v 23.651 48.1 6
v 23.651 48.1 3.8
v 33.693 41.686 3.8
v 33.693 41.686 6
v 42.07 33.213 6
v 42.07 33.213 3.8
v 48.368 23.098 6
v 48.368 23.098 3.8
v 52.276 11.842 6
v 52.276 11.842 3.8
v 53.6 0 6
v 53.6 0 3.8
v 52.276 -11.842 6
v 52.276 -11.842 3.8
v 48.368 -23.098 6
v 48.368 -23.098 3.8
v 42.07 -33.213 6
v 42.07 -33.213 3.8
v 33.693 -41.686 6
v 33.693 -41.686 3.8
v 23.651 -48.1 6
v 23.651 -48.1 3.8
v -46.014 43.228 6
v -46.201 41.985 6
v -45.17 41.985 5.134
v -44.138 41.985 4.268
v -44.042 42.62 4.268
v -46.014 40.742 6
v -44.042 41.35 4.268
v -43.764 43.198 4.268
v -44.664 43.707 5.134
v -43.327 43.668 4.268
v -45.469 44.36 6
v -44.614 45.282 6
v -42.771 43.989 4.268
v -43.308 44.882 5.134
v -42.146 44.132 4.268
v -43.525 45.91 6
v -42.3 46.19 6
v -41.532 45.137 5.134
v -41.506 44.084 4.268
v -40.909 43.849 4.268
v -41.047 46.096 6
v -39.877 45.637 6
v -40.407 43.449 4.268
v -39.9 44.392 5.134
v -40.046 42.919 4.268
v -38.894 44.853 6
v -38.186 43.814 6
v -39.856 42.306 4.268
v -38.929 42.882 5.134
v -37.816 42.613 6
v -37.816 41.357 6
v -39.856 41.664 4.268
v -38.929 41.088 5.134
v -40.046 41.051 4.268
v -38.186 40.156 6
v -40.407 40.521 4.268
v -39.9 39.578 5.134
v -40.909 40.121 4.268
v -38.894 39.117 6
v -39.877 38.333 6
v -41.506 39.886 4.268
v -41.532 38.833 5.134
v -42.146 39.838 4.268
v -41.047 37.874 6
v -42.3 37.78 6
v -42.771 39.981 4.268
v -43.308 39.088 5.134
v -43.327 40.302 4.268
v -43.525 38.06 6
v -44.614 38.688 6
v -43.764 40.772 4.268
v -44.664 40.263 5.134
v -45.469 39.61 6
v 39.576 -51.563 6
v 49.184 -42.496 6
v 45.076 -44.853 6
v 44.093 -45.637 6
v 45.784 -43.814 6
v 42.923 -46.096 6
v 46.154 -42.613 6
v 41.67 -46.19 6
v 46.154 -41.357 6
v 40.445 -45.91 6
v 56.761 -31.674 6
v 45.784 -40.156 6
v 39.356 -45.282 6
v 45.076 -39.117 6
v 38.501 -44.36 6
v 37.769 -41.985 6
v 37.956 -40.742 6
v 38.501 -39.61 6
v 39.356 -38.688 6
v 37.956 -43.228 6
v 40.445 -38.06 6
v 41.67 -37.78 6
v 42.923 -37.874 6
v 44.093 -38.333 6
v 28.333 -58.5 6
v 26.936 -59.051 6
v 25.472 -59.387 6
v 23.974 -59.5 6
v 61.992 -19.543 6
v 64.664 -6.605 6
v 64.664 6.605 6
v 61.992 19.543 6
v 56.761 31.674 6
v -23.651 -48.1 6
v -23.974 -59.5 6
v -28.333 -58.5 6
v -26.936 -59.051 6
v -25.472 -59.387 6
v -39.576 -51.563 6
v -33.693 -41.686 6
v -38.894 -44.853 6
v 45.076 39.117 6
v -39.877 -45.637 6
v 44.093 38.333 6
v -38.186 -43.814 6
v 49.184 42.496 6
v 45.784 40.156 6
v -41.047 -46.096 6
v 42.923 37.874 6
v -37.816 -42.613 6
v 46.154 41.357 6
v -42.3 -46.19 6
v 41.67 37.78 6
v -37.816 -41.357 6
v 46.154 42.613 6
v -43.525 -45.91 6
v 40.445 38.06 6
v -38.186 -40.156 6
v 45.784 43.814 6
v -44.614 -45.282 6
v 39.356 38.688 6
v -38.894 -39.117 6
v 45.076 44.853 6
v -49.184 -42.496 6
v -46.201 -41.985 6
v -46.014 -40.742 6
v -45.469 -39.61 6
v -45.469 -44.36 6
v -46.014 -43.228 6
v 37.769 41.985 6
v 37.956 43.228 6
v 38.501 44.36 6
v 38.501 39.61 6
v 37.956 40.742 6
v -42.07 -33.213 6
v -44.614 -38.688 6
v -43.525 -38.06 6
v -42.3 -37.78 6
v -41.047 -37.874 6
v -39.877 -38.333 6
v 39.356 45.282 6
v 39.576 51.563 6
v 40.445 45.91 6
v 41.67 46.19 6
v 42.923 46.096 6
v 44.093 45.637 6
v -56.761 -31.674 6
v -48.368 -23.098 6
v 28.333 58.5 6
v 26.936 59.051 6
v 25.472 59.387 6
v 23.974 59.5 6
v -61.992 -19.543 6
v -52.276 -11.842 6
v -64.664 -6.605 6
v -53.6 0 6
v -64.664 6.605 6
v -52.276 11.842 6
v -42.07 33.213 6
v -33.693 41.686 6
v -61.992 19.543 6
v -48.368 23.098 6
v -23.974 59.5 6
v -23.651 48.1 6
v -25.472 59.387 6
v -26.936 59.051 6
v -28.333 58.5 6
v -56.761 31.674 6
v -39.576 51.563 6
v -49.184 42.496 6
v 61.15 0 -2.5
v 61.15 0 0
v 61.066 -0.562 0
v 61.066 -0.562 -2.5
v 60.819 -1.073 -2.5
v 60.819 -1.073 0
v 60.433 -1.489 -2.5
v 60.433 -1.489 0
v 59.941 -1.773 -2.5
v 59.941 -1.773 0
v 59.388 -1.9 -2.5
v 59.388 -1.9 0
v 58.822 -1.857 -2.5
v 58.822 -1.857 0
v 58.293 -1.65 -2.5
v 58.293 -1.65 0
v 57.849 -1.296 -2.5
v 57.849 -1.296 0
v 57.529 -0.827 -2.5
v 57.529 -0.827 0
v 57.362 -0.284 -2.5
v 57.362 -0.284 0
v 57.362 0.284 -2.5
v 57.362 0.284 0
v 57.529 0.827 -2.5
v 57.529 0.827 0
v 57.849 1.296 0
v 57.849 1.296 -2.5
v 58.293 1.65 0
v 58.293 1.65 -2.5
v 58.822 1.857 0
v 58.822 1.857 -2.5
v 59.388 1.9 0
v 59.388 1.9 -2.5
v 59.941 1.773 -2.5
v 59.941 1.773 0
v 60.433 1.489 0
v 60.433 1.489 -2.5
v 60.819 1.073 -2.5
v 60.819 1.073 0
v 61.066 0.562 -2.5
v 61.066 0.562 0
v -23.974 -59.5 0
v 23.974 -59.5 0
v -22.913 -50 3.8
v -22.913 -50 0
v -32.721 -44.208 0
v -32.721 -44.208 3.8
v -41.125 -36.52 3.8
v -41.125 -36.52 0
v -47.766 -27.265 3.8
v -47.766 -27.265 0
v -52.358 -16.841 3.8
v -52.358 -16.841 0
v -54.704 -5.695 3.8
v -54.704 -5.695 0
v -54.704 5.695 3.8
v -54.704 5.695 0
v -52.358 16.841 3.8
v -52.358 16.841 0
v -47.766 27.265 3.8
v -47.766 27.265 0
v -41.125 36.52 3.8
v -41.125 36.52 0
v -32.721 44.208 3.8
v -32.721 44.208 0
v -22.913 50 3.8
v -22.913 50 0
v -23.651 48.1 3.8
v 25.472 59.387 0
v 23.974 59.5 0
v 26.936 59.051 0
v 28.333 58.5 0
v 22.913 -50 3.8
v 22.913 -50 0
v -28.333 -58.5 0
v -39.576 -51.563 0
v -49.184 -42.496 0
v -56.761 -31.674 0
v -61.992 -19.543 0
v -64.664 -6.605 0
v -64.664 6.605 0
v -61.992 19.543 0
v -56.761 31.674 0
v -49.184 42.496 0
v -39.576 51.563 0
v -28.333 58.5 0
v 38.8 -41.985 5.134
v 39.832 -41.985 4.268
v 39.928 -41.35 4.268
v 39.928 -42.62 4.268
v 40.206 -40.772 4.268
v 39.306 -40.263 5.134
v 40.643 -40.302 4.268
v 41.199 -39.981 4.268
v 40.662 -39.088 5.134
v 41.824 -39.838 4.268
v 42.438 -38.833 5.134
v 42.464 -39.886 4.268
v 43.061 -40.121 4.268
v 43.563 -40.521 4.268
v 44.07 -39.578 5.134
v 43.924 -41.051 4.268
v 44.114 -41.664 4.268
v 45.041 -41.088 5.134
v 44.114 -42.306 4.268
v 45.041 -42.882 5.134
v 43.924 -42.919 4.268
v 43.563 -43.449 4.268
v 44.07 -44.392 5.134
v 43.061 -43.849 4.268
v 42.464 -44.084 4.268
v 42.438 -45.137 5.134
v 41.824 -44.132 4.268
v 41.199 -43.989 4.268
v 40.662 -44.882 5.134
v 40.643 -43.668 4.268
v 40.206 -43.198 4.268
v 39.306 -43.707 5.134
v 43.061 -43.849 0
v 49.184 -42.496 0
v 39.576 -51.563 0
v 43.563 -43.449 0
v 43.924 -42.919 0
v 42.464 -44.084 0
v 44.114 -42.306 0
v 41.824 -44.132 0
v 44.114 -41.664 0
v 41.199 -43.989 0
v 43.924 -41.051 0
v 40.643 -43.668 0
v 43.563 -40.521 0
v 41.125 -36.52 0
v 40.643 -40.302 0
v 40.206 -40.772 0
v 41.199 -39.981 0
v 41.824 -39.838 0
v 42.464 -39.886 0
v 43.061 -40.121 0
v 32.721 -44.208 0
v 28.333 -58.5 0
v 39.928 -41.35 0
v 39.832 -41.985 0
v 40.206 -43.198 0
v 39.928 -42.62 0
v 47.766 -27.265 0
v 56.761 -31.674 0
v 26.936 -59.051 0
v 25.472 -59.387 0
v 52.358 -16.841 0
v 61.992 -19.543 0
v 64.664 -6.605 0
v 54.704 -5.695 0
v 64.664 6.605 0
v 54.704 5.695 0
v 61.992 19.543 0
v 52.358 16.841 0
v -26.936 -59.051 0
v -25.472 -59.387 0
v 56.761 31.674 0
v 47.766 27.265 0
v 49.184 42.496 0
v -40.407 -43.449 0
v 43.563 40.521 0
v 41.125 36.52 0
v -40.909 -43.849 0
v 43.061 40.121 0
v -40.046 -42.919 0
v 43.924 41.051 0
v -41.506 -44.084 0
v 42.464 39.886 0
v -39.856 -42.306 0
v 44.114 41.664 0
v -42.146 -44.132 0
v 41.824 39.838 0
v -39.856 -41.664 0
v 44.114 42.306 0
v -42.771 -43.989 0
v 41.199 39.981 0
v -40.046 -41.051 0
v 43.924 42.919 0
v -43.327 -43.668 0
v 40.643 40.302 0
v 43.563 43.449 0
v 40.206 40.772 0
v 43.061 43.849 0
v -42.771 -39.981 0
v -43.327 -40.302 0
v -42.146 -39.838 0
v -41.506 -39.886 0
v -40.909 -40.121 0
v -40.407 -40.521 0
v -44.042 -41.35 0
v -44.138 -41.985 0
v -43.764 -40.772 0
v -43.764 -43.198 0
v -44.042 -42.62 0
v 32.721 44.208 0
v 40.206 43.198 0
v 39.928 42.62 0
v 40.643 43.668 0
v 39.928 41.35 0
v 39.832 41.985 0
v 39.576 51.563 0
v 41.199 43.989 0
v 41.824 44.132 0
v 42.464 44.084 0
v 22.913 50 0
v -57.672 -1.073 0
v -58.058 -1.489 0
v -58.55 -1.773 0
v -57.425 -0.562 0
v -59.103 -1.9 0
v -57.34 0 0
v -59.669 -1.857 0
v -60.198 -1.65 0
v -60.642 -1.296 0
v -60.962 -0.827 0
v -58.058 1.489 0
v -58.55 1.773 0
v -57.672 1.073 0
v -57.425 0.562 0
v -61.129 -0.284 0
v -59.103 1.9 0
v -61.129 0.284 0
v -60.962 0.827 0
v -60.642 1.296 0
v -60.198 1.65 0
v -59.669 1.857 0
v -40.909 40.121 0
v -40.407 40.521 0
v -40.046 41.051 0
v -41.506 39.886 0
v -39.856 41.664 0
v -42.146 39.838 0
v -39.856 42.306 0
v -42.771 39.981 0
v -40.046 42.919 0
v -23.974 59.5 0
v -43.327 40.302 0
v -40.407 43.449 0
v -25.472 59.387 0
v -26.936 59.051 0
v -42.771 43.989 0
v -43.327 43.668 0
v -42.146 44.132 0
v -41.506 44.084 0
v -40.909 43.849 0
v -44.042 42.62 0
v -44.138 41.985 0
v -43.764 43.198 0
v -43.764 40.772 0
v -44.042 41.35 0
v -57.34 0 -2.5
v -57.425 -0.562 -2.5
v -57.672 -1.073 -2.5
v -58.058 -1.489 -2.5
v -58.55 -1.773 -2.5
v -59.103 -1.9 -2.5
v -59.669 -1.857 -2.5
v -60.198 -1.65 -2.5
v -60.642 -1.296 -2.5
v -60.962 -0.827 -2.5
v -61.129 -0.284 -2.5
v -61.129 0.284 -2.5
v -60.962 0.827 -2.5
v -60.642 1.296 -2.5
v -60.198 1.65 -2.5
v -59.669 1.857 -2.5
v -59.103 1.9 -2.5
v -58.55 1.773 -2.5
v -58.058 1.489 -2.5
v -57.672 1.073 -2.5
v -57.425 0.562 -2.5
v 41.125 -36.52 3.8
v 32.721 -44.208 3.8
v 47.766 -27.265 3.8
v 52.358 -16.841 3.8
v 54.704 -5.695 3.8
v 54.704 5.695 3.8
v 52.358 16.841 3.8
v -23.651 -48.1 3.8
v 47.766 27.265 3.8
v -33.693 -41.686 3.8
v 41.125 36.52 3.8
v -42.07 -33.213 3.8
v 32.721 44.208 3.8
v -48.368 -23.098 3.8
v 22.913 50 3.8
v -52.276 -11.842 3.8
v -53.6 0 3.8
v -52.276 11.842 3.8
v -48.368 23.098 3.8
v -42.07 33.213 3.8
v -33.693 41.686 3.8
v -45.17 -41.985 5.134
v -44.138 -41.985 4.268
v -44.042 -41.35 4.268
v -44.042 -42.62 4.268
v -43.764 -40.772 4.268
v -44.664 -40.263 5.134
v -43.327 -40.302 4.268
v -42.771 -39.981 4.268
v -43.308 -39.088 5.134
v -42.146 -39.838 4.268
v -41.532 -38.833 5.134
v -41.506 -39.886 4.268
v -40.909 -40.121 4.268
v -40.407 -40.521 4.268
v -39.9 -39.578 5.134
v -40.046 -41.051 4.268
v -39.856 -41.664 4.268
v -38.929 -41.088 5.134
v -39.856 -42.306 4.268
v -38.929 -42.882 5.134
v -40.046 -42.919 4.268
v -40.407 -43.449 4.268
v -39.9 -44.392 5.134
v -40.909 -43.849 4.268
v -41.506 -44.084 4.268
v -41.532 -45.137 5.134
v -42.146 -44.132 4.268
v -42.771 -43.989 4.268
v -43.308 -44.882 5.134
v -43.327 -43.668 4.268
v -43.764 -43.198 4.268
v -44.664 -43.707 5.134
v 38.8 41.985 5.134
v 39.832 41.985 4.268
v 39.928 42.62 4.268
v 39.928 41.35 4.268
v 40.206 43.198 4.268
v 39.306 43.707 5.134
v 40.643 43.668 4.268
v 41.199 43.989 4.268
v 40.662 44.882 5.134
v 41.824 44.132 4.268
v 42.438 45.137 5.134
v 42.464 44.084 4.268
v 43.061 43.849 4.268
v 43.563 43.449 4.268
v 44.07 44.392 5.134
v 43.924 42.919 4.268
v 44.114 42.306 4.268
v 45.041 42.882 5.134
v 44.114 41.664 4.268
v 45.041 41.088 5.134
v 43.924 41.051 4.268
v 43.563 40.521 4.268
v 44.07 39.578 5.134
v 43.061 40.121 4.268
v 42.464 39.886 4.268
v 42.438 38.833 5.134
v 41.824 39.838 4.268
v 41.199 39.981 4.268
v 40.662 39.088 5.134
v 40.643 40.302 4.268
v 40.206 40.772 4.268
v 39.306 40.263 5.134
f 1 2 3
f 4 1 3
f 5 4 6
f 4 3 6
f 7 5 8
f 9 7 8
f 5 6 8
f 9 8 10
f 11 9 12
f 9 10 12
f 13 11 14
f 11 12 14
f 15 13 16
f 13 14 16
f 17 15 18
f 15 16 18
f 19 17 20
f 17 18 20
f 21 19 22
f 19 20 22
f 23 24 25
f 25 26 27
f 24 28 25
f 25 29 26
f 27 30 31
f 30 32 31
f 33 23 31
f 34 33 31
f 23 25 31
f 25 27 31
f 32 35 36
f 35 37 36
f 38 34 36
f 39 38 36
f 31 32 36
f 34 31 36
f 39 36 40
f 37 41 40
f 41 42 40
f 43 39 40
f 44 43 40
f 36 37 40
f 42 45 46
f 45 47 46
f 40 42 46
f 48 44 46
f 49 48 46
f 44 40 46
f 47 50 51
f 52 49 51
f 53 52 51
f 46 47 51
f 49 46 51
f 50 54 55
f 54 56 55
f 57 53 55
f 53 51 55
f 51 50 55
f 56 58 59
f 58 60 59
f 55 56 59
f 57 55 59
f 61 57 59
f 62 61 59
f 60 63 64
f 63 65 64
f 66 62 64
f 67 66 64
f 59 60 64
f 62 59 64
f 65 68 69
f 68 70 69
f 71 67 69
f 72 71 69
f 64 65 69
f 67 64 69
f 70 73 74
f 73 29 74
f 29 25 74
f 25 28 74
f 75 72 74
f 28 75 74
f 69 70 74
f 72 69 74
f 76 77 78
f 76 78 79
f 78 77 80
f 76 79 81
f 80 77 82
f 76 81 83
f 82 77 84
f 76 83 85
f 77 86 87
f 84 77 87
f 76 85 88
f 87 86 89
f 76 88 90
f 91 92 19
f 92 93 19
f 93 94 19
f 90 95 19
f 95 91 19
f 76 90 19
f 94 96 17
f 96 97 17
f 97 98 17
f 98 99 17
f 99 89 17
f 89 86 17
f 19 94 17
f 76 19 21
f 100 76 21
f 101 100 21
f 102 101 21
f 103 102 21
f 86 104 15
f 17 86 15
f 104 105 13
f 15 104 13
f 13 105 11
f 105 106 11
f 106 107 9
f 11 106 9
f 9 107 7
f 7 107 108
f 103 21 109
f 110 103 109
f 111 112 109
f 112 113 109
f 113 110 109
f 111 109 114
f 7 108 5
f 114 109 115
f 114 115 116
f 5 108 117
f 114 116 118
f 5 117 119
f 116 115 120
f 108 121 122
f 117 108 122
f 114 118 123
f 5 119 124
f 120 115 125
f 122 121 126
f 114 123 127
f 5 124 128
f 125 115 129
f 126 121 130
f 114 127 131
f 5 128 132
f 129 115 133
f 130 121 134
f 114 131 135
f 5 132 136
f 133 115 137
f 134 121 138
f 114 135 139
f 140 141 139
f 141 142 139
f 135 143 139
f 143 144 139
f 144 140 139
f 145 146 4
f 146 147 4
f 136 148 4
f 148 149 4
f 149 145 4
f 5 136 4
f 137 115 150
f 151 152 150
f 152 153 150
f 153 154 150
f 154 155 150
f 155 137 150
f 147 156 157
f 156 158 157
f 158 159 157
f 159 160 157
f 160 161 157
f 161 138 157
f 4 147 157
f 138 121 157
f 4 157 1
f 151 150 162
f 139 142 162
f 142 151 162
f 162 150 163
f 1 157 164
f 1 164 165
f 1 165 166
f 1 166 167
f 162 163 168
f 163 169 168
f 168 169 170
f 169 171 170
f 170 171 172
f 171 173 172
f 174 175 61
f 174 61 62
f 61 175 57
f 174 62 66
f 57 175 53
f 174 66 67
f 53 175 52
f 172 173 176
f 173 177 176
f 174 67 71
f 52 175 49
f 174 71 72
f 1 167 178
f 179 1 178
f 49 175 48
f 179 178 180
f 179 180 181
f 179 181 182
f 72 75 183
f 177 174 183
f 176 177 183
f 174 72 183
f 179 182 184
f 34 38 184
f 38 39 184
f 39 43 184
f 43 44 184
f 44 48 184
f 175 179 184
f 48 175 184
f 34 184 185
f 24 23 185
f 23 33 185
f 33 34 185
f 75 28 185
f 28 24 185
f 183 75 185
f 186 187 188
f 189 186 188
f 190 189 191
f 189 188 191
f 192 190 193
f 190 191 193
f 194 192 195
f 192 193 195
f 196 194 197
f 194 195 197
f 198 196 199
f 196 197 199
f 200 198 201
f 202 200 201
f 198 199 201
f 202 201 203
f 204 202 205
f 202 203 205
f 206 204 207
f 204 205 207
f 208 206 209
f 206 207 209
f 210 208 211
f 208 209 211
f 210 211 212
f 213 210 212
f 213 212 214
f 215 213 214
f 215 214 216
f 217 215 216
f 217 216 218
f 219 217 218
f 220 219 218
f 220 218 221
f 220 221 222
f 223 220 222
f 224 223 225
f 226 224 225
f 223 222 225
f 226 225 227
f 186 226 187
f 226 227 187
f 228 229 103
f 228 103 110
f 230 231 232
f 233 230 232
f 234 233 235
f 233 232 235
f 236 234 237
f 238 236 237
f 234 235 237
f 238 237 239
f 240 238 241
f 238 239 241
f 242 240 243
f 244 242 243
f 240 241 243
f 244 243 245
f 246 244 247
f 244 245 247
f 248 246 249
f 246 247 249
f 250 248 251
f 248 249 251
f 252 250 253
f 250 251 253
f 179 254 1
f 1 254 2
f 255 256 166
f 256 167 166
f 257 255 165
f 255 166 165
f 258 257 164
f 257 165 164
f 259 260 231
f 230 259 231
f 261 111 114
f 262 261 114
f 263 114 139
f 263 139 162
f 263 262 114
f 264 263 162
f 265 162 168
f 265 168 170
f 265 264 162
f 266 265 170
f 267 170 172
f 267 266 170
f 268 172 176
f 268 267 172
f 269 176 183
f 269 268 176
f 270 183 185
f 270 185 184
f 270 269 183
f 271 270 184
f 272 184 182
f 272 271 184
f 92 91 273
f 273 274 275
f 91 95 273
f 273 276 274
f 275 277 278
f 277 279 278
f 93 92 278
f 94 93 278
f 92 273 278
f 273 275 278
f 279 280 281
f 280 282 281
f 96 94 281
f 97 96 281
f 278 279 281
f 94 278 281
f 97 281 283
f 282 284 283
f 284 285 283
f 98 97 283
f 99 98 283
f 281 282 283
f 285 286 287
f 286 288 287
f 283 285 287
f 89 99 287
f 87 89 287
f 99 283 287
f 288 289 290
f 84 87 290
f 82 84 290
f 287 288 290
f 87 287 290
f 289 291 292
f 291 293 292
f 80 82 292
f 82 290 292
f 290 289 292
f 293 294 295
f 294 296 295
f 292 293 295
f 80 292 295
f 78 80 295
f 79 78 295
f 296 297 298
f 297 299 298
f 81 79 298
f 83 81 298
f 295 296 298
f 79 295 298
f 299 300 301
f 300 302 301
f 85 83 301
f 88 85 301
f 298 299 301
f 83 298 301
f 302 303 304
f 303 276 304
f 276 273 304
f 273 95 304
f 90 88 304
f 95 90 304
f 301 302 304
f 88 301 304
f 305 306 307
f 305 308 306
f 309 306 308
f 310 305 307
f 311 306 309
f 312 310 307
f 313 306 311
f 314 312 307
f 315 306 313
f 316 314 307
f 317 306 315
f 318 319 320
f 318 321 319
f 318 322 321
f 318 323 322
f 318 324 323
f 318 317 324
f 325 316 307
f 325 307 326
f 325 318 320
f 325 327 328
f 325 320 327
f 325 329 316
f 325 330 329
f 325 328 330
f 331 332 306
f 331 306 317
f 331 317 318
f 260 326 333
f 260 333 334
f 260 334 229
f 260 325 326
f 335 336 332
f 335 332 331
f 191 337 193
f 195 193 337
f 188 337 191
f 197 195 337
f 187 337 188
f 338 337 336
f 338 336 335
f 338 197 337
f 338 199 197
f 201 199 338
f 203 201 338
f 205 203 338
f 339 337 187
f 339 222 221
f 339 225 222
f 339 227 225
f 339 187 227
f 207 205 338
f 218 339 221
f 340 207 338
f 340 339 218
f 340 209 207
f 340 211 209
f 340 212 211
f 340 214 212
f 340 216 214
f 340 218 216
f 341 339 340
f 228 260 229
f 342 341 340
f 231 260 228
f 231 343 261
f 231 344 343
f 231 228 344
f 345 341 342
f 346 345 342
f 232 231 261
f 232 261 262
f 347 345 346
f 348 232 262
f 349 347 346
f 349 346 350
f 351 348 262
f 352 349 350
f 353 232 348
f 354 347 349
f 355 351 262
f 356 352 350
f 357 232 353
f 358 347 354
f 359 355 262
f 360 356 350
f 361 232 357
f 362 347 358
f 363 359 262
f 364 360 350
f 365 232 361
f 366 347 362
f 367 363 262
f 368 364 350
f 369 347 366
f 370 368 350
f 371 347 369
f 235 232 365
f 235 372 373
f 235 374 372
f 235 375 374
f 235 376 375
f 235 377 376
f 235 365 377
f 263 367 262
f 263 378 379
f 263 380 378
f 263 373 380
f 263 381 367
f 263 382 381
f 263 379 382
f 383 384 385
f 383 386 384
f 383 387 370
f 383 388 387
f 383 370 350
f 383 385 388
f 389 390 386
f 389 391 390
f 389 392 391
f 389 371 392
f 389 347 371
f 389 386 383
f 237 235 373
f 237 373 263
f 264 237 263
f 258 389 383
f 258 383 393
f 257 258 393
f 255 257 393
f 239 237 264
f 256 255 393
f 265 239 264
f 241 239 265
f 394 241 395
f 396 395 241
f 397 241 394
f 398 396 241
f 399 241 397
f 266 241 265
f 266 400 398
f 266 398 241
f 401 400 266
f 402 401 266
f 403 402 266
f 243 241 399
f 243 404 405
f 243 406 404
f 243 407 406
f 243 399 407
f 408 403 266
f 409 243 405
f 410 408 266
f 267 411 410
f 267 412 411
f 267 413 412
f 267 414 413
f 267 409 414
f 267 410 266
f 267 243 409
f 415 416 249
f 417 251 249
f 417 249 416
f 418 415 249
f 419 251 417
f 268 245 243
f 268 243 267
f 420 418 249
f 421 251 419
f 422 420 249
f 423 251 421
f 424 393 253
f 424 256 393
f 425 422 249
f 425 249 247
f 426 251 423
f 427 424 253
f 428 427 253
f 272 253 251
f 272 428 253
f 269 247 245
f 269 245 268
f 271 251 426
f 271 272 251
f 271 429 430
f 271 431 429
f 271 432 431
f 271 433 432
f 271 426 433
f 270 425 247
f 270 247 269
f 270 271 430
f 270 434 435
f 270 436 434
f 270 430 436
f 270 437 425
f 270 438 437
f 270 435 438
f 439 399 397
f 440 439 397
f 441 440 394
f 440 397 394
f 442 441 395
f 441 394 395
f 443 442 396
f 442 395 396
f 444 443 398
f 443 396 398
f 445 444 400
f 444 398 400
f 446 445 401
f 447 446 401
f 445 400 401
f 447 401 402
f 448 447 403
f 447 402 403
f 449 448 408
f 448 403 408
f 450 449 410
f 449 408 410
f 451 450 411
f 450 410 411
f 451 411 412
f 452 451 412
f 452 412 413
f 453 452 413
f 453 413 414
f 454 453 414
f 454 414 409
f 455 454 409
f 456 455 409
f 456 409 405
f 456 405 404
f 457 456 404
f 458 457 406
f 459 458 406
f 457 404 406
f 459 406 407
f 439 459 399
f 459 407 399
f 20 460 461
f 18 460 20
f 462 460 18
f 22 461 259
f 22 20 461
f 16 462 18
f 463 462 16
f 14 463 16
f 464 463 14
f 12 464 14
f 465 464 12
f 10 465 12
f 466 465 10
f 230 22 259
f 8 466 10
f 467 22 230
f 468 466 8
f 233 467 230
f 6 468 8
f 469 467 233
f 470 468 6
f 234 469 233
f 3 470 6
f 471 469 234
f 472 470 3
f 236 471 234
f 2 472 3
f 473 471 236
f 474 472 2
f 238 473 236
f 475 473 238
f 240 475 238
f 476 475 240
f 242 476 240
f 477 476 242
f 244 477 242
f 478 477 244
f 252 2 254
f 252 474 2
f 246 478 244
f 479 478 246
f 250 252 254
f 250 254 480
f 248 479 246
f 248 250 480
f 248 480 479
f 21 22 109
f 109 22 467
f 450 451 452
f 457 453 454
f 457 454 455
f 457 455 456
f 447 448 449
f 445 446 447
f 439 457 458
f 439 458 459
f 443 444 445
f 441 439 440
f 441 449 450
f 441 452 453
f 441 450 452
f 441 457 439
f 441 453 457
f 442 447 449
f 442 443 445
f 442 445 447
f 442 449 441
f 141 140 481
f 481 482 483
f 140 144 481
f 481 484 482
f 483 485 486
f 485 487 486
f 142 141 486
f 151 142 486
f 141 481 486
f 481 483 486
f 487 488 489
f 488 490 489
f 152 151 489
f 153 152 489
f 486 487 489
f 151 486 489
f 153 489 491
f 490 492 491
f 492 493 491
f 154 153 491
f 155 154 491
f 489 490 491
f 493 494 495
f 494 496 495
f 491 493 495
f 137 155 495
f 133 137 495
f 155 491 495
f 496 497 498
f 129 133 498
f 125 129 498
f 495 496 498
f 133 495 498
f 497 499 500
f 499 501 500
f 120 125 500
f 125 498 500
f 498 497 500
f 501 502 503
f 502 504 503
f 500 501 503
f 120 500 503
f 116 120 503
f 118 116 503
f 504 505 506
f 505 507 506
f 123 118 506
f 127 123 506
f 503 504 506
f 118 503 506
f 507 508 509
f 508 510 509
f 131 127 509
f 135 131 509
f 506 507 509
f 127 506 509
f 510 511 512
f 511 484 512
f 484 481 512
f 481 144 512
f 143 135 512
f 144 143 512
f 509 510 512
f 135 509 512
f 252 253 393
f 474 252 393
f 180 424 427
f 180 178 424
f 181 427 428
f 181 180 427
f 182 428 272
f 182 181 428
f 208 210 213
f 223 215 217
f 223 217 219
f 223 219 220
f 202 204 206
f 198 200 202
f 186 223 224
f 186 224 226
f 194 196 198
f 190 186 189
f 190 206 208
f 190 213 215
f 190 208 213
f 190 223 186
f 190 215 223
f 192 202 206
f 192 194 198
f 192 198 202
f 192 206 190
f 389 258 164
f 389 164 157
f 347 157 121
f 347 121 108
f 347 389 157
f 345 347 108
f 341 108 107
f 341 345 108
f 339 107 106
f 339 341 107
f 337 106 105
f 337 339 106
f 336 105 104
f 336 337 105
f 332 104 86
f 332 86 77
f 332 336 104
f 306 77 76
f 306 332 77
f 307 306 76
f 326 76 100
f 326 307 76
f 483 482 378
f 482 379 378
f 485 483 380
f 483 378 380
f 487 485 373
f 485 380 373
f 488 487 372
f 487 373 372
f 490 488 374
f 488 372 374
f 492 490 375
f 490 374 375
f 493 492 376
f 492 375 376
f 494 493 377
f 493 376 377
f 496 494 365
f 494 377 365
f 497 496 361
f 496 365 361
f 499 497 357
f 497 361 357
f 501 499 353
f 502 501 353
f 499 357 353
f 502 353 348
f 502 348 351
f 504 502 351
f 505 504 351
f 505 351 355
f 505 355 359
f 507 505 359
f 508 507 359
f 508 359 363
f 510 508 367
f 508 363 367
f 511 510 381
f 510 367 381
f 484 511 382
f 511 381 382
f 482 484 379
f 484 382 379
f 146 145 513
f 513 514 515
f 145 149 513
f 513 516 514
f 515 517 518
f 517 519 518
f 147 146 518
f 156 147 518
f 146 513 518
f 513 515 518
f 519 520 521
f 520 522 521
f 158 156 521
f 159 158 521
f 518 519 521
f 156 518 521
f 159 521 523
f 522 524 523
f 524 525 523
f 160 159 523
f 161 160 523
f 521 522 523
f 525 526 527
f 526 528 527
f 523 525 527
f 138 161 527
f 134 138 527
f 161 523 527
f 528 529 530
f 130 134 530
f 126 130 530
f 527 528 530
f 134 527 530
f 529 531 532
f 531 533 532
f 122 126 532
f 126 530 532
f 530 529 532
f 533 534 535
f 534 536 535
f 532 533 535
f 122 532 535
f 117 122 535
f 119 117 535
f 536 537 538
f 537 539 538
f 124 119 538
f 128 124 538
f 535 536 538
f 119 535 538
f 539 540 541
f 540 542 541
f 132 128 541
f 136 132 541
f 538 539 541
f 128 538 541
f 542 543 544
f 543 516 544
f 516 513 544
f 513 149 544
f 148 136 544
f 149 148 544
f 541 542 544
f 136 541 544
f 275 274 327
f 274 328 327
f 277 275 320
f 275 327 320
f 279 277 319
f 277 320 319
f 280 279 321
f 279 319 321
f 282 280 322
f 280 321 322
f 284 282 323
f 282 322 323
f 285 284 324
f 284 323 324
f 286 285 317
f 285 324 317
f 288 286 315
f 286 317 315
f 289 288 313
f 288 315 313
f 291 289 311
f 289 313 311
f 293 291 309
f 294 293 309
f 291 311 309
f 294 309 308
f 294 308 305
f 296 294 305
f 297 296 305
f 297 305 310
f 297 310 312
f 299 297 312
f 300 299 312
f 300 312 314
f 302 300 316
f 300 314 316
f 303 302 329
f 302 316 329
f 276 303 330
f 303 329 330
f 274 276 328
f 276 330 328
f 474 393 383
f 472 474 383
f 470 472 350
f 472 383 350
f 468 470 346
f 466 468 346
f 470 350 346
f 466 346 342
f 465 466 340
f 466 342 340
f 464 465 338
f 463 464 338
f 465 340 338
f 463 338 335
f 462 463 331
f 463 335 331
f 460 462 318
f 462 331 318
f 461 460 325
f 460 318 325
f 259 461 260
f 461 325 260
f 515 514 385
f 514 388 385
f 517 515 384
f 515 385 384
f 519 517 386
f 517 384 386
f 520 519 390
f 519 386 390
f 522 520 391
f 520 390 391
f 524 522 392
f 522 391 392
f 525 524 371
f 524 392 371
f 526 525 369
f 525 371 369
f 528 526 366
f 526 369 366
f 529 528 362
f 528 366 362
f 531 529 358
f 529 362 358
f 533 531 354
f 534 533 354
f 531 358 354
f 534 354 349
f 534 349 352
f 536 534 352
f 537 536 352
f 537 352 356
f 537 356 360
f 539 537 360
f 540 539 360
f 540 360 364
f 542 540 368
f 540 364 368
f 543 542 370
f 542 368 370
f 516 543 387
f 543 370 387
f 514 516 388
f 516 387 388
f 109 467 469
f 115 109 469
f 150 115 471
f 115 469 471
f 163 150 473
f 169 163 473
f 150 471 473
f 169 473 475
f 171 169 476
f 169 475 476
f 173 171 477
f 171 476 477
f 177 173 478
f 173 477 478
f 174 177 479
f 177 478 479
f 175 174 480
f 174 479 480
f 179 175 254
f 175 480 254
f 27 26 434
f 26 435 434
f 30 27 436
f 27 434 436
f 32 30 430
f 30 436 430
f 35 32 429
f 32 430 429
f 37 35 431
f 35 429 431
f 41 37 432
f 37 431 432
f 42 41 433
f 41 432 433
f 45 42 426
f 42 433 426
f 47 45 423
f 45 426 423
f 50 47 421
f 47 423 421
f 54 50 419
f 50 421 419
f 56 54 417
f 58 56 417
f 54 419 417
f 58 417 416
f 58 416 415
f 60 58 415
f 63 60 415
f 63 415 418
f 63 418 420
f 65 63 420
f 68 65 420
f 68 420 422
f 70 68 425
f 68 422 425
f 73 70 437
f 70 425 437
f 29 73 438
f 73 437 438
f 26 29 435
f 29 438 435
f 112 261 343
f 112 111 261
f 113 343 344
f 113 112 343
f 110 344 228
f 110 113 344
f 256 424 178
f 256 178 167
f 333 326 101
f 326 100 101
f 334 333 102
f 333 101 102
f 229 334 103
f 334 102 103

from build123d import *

# Parameters (mm, degrees)
BOSS_EXTRUDE1_DEPTH                               = 6
CSK_FOR_8_FLAT_HEAD_MACHINE_SCREW_100_D           = 4.3053
CSK_FOR_8_FLAT_HEAD_MACHINE_SCREW_100_CSINK_D     = 8.4328
CSK_FOR_8_FLAT_HEAD_MACHINE_SCREW_100_CSINK_ANGLE = 100
SKETCH5_R                                         = 1.905
BOSS_EXTRUDE2_DEPTH                               = 2.5
FILLET1_R                                         = 10
CUT_EXTRUDE1_DEPTH                                = 3.8


with BuildPart() as part:
    # Sketch1 → Boss-Extrude1 (new body)
    with BuildSketch(Plane.XY):
        with BuildLine():
            Line((-26.167728216, 59.5), (26.167728216, 59.5))
            ThreePointArc((26.167728216, 59.5), (65, 0), (26.167728216, -59.5))
            Line((26.167728216, -59.5), (-26.167728216, -59.5))
            ThreePointArc((-26.167728216, -59.5), (-65, 0), (-26.167728216, 59.5))
        make_face()
        with BuildLine():
            Line((-23.650581388, 48.1), (23.650581388, 48.1))
            ThreePointArc((23.650581388, 48.1), (53.6, 0), (23.650581388, -48.1))
            Line((23.650581388, -48.1), (-23.650581388, -48.1))
            ThreePointArc((-23.650581388, -48.1), (-53.6, 0), (-23.650581388, 48.1))
        make_face(mode=Mode.SUBTRACT)
    extrude(amount=BOSS_EXTRUDE1_DEPTH)

    # CSK for #8 Flat Head Machine Screw (100)1 (through all)
    with Locations(Plane.XY.offset(6)):
        with Locations((0, 0), (41.985, 41.985), (-41.985, -41.985), (-41.985, 41.985), (41.985, -41.985)):
            CounterSinkHole(CSK_FOR_8_FLAT_HEAD_MACHINE_SCREW_100_D / 2, CSK_FOR_8_FLAT_HEAD_MACHINE_SCREW_100_CSINK_D / 2, counter_sink_angle=CSK_FOR_8_FLAT_HEAD_MACHINE_SCREW_100_CSINK_ANGLE)

    # Sketch5 → Boss-Extrude2 (add)
    with BuildSketch(Plane(origin=(0, 0, 0), x_dir=(-1, 0, 0), z_dir=(0, 0, -1))):
        with Locations(Location((-59.2455, 0, 0), (0, 0, 180))):
            Circle(SKETCH5_R)
        with Locations(Location((59.2455, 0, 0), (0, 0, 180))):
            Circle(SKETCH5_R)
    extrude(amount=BOSS_EXTRUDE2_DEPTH)

    # Fillet1
    fillet1_edges = [part.edges().sort_by_distance(p)[0] for p in [
        (26.167728216, -59.5, 3),
        (-26.167728216, -59.5, 3),
        (-26.167728216, 59.5, 3),
        (26.167728216, 59.5, 3),
    ]]
    fillet(fillet1_edges, radius=FILLET1_R)

    # Sketch6 → Cut-Extrude1 (cut)
    with BuildSketch(Plane(origin=(0, 0, 0), x_dir=(-1, 0, 0), z_dir=(0, 0, -1))):
        with BuildLine():
            Line((22.912878475, 50), (-22.912878475, 50))
            ThreePointArc((-22.912878475, 50), (-55, 0), (-22.912878475, -50))
            Line((-22.912878475, -50), (22.912878475, -50))
            ThreePointArc((22.912878475, -50), (55, 0), (22.912878475, 50))
        make_face()
    extrude(amount=-CUT_EXTRUDE1_DEPTH, mode=Mode.SUBTRACT)


solid = part.part
